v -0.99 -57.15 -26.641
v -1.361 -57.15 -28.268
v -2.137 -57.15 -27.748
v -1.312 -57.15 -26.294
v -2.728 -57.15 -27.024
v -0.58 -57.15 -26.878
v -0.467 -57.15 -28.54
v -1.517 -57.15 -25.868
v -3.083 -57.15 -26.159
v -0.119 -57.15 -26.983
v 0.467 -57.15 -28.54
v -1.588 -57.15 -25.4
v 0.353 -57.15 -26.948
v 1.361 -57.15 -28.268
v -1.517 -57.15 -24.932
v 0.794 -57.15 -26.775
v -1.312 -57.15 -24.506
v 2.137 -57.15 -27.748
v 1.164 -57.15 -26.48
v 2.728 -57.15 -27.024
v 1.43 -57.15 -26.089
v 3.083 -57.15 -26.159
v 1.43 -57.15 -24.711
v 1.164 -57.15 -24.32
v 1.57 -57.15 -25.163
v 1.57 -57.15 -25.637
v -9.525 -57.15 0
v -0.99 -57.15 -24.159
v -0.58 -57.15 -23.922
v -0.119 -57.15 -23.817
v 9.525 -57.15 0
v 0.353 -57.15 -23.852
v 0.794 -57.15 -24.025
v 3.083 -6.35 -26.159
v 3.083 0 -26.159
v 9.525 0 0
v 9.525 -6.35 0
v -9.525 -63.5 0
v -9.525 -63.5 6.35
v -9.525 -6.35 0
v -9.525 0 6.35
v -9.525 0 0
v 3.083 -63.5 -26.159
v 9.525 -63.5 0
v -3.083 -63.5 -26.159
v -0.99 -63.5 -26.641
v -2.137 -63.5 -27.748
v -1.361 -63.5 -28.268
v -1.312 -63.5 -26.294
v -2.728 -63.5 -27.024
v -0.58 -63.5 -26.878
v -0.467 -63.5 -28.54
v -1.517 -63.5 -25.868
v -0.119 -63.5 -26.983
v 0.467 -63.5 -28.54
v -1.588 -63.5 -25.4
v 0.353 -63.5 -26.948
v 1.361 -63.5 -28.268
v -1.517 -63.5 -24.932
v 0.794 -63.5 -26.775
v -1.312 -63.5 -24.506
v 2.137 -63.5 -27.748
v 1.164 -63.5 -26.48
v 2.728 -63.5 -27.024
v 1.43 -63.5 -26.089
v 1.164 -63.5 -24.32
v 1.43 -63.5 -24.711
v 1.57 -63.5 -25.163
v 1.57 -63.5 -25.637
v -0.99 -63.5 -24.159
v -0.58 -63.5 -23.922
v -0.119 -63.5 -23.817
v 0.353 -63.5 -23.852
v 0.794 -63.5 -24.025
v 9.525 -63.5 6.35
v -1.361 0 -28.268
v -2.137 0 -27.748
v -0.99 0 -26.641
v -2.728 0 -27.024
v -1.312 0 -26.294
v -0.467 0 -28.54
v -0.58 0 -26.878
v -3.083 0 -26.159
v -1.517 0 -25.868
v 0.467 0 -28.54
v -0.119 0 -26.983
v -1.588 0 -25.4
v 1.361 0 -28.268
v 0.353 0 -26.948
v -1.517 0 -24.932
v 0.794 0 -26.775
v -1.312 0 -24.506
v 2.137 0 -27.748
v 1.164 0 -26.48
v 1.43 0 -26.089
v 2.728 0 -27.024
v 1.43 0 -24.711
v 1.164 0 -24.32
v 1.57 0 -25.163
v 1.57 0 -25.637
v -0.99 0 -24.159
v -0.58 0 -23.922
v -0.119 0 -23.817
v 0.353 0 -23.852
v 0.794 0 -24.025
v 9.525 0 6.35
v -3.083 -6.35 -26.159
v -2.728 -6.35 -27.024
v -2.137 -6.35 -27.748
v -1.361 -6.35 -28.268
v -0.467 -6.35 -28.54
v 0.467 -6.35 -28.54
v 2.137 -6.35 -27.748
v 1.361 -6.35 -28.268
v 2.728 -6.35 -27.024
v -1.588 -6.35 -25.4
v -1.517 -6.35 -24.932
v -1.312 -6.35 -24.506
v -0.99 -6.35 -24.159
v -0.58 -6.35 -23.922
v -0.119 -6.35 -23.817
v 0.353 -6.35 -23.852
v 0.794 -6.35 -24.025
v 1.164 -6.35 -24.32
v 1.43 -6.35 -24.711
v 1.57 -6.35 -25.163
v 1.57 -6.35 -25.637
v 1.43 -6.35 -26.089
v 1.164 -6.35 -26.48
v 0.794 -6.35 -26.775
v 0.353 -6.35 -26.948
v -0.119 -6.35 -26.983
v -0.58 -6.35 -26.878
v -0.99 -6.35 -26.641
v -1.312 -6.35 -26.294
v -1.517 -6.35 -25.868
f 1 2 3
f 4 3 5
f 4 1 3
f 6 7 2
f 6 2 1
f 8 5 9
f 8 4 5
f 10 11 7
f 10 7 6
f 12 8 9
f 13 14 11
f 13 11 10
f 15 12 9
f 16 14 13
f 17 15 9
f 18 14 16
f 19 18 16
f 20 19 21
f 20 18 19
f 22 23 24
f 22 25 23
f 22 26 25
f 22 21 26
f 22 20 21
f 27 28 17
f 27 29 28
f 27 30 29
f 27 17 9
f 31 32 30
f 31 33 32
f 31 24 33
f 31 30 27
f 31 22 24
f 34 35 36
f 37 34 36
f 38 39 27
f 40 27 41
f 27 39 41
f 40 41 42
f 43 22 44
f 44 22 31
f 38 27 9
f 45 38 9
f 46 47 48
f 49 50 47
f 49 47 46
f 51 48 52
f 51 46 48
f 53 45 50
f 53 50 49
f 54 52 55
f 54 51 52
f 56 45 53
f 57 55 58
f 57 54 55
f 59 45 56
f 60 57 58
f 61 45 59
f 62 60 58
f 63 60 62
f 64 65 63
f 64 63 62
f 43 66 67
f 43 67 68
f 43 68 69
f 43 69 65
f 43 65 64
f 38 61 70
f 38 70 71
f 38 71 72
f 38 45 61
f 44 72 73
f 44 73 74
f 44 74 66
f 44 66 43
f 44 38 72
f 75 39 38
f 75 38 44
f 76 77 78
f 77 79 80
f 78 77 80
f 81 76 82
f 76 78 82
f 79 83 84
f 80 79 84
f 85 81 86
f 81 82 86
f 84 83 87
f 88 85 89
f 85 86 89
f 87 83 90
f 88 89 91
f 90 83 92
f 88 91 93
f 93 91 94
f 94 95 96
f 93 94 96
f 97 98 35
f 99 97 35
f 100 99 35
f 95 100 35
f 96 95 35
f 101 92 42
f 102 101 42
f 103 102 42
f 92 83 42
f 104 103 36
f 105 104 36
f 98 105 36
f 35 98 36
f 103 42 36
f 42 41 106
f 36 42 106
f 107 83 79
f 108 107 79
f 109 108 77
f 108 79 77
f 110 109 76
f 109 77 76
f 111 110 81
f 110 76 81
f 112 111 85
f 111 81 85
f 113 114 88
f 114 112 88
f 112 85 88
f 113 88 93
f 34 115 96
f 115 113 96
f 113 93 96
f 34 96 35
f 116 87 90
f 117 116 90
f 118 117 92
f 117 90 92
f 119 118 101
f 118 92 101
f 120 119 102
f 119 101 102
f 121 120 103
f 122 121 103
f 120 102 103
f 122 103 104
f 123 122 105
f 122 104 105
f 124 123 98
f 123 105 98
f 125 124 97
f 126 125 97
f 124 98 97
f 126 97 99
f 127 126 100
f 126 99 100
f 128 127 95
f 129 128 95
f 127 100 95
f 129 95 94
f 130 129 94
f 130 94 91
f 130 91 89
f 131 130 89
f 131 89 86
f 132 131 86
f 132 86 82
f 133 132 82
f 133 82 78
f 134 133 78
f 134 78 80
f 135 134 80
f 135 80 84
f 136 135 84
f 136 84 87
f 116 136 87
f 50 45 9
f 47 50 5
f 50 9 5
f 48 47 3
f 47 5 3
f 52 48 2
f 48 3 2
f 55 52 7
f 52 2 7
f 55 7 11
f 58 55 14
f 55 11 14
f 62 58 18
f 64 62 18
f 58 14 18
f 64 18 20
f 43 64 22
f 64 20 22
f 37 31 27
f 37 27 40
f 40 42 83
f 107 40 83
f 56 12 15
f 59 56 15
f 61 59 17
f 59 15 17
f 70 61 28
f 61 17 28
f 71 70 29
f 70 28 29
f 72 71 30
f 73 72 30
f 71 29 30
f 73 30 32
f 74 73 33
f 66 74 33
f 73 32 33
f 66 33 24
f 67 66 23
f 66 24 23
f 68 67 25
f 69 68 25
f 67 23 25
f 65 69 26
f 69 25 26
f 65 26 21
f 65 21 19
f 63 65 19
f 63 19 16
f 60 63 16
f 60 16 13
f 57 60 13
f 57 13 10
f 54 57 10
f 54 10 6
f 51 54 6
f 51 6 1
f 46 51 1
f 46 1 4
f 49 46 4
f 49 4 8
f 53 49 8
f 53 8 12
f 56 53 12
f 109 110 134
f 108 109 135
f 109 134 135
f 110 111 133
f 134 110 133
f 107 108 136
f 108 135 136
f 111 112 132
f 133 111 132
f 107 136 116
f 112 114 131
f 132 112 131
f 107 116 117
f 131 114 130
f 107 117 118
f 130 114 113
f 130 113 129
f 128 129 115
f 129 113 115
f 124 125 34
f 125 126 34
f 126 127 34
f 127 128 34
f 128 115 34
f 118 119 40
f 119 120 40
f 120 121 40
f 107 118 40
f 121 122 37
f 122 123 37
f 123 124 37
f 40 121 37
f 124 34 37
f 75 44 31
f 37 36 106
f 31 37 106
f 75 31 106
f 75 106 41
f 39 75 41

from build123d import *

# Parameters (mm, degrees)
F1_DEPTH = 63.5
F2_W     = 50.8
F2_H     = 35.000445
F3_DEPTH = 19.051
F4_R     = 1.5875
F5_DEPTH = 63.501


with BuildPart() as f1:
    # F0 (on Front) → F1 (new body)
    with BuildSketch(Plane.XZ):
        with BuildLine():
            Line((-9.525, 6.35), (-9.525, 0))
            Line((-9.525, 0), (-3.082892, -26.15921))
            ThreePointArc((-3.082892, -26.15921), (0, -28.575), (3.082892, -26.15921))
            Line((3.082892, -26.15921), (9.525, 0))
            Line((9.525, 0), (9.525, 6.35))
            Line((9.525, 6.35), (-9.525, 6.35))
        make_face()
    extrude(amount=F1_DEPTH)

    # F2 (on face) → F3 (cut, through all)
    with BuildSketch(Plane.YZ.offset(9.525)):
        with Locations((-31.75, -17.500222)):
            Rectangle(F2_W, F2_H)
    extrude(amount=-F3_DEPTH, mode=Mode.SUBTRACT)

    # F4 (on face) → F5 (cut, through all)
    with BuildSketch(Plane(origin=(0, 0, 0), x_dir=(-1, 0, 0), z_dir=(0, 1, 0))):
        with Locations((0, -25.4)):
            Circle(F4_R)
    extrude(amount=-F5_DEPTH, mode=Mode.SUBTRACT)


solid = f1.part
